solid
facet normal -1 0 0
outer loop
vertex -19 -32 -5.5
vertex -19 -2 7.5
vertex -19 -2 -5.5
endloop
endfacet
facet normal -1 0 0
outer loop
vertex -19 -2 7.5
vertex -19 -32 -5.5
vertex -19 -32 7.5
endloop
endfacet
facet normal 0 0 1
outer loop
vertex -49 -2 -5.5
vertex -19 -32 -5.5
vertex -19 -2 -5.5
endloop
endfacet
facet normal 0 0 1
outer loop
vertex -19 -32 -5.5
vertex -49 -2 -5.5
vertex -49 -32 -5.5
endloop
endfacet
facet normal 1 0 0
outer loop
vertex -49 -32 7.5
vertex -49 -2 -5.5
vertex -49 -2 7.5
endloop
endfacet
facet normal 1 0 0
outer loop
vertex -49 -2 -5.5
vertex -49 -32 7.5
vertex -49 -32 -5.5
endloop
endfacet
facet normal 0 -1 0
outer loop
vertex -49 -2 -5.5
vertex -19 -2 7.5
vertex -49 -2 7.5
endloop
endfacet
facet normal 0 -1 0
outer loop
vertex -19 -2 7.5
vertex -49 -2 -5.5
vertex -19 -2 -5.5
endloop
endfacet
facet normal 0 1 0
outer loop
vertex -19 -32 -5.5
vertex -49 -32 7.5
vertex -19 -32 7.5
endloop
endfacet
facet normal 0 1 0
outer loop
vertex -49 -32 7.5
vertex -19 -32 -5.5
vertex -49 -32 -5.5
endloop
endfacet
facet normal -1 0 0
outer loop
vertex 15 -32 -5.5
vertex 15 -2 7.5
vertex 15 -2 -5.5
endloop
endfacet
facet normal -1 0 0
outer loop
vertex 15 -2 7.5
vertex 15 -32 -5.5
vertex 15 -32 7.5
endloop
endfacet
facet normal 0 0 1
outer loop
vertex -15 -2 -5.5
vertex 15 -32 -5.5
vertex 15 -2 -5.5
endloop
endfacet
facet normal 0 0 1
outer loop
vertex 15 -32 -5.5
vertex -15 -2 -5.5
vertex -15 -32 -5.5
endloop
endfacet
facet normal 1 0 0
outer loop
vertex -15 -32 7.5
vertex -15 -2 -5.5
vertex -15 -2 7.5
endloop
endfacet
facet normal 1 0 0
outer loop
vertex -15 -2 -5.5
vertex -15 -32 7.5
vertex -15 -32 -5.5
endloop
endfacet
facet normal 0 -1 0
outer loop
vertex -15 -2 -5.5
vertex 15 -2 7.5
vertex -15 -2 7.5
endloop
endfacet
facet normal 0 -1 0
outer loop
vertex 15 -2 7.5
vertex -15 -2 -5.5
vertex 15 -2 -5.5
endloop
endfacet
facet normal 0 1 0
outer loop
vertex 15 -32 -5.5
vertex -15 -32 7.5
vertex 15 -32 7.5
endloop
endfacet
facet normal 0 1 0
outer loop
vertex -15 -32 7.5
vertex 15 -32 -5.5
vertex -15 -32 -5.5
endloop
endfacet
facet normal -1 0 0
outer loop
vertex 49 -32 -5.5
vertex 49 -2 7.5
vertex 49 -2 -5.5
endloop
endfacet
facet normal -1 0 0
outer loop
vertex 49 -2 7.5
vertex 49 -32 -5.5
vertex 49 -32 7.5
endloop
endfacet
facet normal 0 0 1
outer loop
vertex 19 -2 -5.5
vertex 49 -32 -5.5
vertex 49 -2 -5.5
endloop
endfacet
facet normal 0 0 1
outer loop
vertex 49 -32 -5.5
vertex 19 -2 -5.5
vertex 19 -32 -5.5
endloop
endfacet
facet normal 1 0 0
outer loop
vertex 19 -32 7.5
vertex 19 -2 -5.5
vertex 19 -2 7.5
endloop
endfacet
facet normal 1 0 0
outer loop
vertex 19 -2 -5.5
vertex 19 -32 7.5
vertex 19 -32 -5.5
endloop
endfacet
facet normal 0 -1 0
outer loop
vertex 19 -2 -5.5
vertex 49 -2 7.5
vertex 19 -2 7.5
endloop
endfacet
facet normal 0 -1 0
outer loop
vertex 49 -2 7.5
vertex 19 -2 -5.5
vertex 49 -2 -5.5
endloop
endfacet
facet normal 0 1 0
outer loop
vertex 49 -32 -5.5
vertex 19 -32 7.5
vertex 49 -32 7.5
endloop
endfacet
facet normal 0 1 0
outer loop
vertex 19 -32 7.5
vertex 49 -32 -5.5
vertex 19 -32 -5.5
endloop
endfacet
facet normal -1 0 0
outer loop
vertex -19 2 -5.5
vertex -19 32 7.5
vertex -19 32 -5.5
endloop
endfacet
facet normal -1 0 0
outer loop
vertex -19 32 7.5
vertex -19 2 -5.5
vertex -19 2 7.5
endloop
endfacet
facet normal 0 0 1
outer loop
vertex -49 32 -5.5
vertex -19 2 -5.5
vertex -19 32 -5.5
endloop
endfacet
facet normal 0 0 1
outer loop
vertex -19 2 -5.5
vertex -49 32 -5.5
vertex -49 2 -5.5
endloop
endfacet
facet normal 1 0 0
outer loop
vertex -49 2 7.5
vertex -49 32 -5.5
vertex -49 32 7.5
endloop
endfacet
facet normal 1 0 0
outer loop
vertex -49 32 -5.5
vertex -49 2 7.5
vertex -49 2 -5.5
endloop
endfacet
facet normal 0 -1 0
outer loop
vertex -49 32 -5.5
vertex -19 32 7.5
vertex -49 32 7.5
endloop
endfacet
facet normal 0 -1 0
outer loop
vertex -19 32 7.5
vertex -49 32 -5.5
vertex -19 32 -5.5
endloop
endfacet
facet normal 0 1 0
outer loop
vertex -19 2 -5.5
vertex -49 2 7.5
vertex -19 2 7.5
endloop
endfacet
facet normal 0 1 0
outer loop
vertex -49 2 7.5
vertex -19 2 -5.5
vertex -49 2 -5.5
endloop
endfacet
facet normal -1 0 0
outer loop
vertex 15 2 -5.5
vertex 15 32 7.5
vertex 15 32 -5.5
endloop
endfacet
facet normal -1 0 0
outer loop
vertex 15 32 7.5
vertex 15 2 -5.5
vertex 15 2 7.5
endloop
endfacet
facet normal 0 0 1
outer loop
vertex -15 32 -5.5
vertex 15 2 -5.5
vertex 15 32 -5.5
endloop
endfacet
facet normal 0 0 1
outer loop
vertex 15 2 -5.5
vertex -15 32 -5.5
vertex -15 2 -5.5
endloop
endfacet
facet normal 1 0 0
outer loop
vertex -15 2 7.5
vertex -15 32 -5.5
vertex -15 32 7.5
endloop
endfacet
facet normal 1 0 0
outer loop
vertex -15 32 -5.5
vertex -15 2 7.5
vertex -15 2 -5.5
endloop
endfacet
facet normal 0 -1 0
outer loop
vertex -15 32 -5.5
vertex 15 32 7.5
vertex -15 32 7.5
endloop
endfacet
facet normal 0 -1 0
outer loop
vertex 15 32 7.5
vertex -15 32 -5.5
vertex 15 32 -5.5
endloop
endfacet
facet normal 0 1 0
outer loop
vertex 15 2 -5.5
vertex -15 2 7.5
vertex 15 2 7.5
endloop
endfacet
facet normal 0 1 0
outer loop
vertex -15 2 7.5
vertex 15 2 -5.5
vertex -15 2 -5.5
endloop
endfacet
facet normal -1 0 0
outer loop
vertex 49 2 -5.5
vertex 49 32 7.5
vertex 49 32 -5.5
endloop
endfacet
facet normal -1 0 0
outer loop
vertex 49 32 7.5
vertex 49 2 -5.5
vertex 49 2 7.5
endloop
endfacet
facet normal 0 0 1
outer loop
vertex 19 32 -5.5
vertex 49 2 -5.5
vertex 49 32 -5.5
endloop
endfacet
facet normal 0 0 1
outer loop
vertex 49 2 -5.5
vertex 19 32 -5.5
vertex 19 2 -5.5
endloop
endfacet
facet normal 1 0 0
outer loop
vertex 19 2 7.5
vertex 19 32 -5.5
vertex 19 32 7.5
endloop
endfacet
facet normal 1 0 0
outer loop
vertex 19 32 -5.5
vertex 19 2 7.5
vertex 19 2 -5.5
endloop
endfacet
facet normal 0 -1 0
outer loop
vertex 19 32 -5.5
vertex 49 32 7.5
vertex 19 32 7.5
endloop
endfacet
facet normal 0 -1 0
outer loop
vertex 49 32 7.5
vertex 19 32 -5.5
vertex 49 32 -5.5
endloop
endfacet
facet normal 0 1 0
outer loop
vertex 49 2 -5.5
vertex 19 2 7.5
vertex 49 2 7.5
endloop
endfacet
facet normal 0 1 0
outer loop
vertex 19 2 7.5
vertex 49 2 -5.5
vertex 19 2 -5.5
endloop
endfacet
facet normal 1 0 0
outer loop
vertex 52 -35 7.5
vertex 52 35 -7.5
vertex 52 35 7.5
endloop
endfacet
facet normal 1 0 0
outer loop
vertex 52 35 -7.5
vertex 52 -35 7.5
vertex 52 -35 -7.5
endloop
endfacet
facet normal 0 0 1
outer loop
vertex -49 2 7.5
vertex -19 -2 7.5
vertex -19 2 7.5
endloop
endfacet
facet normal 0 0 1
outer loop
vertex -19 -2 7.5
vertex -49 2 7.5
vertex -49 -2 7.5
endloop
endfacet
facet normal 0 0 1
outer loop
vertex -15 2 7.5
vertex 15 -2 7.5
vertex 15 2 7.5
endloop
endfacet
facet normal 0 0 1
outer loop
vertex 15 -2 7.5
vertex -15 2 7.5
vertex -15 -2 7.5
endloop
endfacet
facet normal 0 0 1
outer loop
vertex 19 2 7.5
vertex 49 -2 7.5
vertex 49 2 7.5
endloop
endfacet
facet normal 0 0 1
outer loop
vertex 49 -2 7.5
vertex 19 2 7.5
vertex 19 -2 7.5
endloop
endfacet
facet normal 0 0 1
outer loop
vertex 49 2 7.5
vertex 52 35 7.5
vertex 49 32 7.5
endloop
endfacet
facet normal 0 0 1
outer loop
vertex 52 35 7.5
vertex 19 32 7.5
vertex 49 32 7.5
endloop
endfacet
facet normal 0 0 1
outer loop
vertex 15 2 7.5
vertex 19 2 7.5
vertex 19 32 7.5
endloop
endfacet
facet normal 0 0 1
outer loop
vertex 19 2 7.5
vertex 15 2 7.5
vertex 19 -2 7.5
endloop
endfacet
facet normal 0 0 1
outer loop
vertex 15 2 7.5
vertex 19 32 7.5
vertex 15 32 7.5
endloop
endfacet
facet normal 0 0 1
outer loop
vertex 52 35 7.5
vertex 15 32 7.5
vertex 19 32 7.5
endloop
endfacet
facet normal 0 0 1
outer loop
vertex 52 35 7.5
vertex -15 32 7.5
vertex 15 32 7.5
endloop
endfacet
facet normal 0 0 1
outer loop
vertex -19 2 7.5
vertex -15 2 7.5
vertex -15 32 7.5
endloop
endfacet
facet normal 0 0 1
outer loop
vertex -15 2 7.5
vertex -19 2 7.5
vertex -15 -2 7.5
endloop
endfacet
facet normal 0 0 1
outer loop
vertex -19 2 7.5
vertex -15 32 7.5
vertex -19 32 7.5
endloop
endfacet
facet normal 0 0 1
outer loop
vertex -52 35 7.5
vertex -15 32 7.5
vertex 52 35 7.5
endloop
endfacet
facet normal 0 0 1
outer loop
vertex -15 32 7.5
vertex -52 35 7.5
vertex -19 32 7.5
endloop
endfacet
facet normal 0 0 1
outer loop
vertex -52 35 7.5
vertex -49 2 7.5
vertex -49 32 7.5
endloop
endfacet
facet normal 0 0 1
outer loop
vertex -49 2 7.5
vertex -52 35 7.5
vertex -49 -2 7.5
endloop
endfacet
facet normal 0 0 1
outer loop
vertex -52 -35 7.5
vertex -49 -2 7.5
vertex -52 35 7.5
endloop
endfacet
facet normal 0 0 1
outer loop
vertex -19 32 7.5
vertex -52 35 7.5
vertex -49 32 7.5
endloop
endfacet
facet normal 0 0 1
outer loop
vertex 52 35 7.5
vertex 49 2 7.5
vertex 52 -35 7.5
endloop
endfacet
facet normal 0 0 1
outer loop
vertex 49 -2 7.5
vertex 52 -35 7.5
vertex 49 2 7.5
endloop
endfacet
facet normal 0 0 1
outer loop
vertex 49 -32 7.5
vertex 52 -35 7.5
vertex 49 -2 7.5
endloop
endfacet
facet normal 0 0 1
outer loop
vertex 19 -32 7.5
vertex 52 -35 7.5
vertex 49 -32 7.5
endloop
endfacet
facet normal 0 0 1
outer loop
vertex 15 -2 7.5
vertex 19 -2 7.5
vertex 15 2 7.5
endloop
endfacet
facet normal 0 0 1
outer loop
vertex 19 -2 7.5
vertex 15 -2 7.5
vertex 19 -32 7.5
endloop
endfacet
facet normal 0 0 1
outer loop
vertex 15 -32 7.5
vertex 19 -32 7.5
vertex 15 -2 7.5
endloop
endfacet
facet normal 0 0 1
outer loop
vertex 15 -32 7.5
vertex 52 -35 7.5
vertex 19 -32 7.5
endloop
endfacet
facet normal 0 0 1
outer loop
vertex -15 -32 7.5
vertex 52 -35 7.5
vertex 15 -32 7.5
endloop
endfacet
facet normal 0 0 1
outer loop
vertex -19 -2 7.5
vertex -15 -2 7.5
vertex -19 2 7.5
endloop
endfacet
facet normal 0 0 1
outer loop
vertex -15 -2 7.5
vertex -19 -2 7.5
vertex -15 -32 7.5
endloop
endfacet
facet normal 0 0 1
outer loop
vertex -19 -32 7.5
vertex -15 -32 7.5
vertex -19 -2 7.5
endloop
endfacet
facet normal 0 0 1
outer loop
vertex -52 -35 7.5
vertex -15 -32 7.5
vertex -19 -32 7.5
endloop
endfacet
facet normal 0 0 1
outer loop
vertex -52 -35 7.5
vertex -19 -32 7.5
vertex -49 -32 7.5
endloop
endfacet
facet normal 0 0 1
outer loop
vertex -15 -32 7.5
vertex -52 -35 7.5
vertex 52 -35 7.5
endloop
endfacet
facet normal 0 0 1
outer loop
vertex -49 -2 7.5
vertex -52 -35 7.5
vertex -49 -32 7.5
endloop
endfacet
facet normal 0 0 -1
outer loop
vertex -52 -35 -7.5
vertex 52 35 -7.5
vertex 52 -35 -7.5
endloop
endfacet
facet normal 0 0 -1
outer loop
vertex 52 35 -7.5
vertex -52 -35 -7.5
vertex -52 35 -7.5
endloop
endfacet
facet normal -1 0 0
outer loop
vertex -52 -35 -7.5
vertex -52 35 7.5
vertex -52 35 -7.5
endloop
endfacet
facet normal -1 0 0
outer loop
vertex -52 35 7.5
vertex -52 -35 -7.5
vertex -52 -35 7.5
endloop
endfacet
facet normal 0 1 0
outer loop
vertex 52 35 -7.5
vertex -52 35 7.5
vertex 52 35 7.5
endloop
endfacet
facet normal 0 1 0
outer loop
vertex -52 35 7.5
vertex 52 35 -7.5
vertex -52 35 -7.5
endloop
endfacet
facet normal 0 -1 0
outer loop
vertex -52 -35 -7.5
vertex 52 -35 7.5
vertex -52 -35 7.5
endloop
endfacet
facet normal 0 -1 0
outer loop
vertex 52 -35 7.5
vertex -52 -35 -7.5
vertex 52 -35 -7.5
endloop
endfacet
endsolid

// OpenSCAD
$fn = 32;

// ----------------------------------------------------------------------
// Pocket plate 104 x 70 x 15
// 2 x 3 pockets 30 mm square, 13 mm deep
// ----------------------------------------------------------------------

// --- parameters (mm) ---
thickness = 15;  // plate thickness
floor_t = 2;     // material left under each pocket
pocket = 30;     // pocket side length
pitch_x = 34;    // pocket pitch along X
pitch_y = 34;    // pocket pitch along Y
cols = 3;        // pockets per row
rows = 2;        // rows of pockets

// --- derived feature positions (mm) ---
depth = thickness - floor_t;        // = 13   pocket depth, down to the floor
span_x = (cols - 1) * pitch_x;      // = 68   distance between outer pockets
span_y = (rows - 1) * pitch_y;      // = 34   distance between outer pocket rows
origin_x = -span_x / 2;             // = -34   X of the first pocket
origin_y = -span_y / 2;             // = -17   Y of the first pocket
plate = [span_x + pocket + 6, span_y + pocket + 6, thickness];  // = [104, 70, 15]   overall size: pockets plus 3 mm of wall on each side
feature_centers = [
  [origin_x + 0 * pitch_x, origin_y + 0 * pitch_y],
  [origin_x + 1 * pitch_x, origin_y + 0 * pitch_y],
  [origin_x + 2 * pitch_x, origin_y + 0 * pitch_y],
  [origin_x + 0 * pitch_x, origin_y + 1 * pitch_y],
  [origin_x + 1 * pitch_x, origin_y + 1 * pitch_y],
  [origin_x + 2 * pitch_x, origin_y + 1 * pitch_y]
];   // pocket centres, used verbatim by the cutter loop

// plate outline, then one pocket per centre in feature_centers
difference() {
  cube(plate, center = true);
  for (centre = feature_centers)
    translate([centre[0] - pocket / 2, centre[1] - pocket / 2, plate[2] / 2 - depth])
      cube([pocket, pocket, depth + 1]);  // centred on the declared pocket centre
}
